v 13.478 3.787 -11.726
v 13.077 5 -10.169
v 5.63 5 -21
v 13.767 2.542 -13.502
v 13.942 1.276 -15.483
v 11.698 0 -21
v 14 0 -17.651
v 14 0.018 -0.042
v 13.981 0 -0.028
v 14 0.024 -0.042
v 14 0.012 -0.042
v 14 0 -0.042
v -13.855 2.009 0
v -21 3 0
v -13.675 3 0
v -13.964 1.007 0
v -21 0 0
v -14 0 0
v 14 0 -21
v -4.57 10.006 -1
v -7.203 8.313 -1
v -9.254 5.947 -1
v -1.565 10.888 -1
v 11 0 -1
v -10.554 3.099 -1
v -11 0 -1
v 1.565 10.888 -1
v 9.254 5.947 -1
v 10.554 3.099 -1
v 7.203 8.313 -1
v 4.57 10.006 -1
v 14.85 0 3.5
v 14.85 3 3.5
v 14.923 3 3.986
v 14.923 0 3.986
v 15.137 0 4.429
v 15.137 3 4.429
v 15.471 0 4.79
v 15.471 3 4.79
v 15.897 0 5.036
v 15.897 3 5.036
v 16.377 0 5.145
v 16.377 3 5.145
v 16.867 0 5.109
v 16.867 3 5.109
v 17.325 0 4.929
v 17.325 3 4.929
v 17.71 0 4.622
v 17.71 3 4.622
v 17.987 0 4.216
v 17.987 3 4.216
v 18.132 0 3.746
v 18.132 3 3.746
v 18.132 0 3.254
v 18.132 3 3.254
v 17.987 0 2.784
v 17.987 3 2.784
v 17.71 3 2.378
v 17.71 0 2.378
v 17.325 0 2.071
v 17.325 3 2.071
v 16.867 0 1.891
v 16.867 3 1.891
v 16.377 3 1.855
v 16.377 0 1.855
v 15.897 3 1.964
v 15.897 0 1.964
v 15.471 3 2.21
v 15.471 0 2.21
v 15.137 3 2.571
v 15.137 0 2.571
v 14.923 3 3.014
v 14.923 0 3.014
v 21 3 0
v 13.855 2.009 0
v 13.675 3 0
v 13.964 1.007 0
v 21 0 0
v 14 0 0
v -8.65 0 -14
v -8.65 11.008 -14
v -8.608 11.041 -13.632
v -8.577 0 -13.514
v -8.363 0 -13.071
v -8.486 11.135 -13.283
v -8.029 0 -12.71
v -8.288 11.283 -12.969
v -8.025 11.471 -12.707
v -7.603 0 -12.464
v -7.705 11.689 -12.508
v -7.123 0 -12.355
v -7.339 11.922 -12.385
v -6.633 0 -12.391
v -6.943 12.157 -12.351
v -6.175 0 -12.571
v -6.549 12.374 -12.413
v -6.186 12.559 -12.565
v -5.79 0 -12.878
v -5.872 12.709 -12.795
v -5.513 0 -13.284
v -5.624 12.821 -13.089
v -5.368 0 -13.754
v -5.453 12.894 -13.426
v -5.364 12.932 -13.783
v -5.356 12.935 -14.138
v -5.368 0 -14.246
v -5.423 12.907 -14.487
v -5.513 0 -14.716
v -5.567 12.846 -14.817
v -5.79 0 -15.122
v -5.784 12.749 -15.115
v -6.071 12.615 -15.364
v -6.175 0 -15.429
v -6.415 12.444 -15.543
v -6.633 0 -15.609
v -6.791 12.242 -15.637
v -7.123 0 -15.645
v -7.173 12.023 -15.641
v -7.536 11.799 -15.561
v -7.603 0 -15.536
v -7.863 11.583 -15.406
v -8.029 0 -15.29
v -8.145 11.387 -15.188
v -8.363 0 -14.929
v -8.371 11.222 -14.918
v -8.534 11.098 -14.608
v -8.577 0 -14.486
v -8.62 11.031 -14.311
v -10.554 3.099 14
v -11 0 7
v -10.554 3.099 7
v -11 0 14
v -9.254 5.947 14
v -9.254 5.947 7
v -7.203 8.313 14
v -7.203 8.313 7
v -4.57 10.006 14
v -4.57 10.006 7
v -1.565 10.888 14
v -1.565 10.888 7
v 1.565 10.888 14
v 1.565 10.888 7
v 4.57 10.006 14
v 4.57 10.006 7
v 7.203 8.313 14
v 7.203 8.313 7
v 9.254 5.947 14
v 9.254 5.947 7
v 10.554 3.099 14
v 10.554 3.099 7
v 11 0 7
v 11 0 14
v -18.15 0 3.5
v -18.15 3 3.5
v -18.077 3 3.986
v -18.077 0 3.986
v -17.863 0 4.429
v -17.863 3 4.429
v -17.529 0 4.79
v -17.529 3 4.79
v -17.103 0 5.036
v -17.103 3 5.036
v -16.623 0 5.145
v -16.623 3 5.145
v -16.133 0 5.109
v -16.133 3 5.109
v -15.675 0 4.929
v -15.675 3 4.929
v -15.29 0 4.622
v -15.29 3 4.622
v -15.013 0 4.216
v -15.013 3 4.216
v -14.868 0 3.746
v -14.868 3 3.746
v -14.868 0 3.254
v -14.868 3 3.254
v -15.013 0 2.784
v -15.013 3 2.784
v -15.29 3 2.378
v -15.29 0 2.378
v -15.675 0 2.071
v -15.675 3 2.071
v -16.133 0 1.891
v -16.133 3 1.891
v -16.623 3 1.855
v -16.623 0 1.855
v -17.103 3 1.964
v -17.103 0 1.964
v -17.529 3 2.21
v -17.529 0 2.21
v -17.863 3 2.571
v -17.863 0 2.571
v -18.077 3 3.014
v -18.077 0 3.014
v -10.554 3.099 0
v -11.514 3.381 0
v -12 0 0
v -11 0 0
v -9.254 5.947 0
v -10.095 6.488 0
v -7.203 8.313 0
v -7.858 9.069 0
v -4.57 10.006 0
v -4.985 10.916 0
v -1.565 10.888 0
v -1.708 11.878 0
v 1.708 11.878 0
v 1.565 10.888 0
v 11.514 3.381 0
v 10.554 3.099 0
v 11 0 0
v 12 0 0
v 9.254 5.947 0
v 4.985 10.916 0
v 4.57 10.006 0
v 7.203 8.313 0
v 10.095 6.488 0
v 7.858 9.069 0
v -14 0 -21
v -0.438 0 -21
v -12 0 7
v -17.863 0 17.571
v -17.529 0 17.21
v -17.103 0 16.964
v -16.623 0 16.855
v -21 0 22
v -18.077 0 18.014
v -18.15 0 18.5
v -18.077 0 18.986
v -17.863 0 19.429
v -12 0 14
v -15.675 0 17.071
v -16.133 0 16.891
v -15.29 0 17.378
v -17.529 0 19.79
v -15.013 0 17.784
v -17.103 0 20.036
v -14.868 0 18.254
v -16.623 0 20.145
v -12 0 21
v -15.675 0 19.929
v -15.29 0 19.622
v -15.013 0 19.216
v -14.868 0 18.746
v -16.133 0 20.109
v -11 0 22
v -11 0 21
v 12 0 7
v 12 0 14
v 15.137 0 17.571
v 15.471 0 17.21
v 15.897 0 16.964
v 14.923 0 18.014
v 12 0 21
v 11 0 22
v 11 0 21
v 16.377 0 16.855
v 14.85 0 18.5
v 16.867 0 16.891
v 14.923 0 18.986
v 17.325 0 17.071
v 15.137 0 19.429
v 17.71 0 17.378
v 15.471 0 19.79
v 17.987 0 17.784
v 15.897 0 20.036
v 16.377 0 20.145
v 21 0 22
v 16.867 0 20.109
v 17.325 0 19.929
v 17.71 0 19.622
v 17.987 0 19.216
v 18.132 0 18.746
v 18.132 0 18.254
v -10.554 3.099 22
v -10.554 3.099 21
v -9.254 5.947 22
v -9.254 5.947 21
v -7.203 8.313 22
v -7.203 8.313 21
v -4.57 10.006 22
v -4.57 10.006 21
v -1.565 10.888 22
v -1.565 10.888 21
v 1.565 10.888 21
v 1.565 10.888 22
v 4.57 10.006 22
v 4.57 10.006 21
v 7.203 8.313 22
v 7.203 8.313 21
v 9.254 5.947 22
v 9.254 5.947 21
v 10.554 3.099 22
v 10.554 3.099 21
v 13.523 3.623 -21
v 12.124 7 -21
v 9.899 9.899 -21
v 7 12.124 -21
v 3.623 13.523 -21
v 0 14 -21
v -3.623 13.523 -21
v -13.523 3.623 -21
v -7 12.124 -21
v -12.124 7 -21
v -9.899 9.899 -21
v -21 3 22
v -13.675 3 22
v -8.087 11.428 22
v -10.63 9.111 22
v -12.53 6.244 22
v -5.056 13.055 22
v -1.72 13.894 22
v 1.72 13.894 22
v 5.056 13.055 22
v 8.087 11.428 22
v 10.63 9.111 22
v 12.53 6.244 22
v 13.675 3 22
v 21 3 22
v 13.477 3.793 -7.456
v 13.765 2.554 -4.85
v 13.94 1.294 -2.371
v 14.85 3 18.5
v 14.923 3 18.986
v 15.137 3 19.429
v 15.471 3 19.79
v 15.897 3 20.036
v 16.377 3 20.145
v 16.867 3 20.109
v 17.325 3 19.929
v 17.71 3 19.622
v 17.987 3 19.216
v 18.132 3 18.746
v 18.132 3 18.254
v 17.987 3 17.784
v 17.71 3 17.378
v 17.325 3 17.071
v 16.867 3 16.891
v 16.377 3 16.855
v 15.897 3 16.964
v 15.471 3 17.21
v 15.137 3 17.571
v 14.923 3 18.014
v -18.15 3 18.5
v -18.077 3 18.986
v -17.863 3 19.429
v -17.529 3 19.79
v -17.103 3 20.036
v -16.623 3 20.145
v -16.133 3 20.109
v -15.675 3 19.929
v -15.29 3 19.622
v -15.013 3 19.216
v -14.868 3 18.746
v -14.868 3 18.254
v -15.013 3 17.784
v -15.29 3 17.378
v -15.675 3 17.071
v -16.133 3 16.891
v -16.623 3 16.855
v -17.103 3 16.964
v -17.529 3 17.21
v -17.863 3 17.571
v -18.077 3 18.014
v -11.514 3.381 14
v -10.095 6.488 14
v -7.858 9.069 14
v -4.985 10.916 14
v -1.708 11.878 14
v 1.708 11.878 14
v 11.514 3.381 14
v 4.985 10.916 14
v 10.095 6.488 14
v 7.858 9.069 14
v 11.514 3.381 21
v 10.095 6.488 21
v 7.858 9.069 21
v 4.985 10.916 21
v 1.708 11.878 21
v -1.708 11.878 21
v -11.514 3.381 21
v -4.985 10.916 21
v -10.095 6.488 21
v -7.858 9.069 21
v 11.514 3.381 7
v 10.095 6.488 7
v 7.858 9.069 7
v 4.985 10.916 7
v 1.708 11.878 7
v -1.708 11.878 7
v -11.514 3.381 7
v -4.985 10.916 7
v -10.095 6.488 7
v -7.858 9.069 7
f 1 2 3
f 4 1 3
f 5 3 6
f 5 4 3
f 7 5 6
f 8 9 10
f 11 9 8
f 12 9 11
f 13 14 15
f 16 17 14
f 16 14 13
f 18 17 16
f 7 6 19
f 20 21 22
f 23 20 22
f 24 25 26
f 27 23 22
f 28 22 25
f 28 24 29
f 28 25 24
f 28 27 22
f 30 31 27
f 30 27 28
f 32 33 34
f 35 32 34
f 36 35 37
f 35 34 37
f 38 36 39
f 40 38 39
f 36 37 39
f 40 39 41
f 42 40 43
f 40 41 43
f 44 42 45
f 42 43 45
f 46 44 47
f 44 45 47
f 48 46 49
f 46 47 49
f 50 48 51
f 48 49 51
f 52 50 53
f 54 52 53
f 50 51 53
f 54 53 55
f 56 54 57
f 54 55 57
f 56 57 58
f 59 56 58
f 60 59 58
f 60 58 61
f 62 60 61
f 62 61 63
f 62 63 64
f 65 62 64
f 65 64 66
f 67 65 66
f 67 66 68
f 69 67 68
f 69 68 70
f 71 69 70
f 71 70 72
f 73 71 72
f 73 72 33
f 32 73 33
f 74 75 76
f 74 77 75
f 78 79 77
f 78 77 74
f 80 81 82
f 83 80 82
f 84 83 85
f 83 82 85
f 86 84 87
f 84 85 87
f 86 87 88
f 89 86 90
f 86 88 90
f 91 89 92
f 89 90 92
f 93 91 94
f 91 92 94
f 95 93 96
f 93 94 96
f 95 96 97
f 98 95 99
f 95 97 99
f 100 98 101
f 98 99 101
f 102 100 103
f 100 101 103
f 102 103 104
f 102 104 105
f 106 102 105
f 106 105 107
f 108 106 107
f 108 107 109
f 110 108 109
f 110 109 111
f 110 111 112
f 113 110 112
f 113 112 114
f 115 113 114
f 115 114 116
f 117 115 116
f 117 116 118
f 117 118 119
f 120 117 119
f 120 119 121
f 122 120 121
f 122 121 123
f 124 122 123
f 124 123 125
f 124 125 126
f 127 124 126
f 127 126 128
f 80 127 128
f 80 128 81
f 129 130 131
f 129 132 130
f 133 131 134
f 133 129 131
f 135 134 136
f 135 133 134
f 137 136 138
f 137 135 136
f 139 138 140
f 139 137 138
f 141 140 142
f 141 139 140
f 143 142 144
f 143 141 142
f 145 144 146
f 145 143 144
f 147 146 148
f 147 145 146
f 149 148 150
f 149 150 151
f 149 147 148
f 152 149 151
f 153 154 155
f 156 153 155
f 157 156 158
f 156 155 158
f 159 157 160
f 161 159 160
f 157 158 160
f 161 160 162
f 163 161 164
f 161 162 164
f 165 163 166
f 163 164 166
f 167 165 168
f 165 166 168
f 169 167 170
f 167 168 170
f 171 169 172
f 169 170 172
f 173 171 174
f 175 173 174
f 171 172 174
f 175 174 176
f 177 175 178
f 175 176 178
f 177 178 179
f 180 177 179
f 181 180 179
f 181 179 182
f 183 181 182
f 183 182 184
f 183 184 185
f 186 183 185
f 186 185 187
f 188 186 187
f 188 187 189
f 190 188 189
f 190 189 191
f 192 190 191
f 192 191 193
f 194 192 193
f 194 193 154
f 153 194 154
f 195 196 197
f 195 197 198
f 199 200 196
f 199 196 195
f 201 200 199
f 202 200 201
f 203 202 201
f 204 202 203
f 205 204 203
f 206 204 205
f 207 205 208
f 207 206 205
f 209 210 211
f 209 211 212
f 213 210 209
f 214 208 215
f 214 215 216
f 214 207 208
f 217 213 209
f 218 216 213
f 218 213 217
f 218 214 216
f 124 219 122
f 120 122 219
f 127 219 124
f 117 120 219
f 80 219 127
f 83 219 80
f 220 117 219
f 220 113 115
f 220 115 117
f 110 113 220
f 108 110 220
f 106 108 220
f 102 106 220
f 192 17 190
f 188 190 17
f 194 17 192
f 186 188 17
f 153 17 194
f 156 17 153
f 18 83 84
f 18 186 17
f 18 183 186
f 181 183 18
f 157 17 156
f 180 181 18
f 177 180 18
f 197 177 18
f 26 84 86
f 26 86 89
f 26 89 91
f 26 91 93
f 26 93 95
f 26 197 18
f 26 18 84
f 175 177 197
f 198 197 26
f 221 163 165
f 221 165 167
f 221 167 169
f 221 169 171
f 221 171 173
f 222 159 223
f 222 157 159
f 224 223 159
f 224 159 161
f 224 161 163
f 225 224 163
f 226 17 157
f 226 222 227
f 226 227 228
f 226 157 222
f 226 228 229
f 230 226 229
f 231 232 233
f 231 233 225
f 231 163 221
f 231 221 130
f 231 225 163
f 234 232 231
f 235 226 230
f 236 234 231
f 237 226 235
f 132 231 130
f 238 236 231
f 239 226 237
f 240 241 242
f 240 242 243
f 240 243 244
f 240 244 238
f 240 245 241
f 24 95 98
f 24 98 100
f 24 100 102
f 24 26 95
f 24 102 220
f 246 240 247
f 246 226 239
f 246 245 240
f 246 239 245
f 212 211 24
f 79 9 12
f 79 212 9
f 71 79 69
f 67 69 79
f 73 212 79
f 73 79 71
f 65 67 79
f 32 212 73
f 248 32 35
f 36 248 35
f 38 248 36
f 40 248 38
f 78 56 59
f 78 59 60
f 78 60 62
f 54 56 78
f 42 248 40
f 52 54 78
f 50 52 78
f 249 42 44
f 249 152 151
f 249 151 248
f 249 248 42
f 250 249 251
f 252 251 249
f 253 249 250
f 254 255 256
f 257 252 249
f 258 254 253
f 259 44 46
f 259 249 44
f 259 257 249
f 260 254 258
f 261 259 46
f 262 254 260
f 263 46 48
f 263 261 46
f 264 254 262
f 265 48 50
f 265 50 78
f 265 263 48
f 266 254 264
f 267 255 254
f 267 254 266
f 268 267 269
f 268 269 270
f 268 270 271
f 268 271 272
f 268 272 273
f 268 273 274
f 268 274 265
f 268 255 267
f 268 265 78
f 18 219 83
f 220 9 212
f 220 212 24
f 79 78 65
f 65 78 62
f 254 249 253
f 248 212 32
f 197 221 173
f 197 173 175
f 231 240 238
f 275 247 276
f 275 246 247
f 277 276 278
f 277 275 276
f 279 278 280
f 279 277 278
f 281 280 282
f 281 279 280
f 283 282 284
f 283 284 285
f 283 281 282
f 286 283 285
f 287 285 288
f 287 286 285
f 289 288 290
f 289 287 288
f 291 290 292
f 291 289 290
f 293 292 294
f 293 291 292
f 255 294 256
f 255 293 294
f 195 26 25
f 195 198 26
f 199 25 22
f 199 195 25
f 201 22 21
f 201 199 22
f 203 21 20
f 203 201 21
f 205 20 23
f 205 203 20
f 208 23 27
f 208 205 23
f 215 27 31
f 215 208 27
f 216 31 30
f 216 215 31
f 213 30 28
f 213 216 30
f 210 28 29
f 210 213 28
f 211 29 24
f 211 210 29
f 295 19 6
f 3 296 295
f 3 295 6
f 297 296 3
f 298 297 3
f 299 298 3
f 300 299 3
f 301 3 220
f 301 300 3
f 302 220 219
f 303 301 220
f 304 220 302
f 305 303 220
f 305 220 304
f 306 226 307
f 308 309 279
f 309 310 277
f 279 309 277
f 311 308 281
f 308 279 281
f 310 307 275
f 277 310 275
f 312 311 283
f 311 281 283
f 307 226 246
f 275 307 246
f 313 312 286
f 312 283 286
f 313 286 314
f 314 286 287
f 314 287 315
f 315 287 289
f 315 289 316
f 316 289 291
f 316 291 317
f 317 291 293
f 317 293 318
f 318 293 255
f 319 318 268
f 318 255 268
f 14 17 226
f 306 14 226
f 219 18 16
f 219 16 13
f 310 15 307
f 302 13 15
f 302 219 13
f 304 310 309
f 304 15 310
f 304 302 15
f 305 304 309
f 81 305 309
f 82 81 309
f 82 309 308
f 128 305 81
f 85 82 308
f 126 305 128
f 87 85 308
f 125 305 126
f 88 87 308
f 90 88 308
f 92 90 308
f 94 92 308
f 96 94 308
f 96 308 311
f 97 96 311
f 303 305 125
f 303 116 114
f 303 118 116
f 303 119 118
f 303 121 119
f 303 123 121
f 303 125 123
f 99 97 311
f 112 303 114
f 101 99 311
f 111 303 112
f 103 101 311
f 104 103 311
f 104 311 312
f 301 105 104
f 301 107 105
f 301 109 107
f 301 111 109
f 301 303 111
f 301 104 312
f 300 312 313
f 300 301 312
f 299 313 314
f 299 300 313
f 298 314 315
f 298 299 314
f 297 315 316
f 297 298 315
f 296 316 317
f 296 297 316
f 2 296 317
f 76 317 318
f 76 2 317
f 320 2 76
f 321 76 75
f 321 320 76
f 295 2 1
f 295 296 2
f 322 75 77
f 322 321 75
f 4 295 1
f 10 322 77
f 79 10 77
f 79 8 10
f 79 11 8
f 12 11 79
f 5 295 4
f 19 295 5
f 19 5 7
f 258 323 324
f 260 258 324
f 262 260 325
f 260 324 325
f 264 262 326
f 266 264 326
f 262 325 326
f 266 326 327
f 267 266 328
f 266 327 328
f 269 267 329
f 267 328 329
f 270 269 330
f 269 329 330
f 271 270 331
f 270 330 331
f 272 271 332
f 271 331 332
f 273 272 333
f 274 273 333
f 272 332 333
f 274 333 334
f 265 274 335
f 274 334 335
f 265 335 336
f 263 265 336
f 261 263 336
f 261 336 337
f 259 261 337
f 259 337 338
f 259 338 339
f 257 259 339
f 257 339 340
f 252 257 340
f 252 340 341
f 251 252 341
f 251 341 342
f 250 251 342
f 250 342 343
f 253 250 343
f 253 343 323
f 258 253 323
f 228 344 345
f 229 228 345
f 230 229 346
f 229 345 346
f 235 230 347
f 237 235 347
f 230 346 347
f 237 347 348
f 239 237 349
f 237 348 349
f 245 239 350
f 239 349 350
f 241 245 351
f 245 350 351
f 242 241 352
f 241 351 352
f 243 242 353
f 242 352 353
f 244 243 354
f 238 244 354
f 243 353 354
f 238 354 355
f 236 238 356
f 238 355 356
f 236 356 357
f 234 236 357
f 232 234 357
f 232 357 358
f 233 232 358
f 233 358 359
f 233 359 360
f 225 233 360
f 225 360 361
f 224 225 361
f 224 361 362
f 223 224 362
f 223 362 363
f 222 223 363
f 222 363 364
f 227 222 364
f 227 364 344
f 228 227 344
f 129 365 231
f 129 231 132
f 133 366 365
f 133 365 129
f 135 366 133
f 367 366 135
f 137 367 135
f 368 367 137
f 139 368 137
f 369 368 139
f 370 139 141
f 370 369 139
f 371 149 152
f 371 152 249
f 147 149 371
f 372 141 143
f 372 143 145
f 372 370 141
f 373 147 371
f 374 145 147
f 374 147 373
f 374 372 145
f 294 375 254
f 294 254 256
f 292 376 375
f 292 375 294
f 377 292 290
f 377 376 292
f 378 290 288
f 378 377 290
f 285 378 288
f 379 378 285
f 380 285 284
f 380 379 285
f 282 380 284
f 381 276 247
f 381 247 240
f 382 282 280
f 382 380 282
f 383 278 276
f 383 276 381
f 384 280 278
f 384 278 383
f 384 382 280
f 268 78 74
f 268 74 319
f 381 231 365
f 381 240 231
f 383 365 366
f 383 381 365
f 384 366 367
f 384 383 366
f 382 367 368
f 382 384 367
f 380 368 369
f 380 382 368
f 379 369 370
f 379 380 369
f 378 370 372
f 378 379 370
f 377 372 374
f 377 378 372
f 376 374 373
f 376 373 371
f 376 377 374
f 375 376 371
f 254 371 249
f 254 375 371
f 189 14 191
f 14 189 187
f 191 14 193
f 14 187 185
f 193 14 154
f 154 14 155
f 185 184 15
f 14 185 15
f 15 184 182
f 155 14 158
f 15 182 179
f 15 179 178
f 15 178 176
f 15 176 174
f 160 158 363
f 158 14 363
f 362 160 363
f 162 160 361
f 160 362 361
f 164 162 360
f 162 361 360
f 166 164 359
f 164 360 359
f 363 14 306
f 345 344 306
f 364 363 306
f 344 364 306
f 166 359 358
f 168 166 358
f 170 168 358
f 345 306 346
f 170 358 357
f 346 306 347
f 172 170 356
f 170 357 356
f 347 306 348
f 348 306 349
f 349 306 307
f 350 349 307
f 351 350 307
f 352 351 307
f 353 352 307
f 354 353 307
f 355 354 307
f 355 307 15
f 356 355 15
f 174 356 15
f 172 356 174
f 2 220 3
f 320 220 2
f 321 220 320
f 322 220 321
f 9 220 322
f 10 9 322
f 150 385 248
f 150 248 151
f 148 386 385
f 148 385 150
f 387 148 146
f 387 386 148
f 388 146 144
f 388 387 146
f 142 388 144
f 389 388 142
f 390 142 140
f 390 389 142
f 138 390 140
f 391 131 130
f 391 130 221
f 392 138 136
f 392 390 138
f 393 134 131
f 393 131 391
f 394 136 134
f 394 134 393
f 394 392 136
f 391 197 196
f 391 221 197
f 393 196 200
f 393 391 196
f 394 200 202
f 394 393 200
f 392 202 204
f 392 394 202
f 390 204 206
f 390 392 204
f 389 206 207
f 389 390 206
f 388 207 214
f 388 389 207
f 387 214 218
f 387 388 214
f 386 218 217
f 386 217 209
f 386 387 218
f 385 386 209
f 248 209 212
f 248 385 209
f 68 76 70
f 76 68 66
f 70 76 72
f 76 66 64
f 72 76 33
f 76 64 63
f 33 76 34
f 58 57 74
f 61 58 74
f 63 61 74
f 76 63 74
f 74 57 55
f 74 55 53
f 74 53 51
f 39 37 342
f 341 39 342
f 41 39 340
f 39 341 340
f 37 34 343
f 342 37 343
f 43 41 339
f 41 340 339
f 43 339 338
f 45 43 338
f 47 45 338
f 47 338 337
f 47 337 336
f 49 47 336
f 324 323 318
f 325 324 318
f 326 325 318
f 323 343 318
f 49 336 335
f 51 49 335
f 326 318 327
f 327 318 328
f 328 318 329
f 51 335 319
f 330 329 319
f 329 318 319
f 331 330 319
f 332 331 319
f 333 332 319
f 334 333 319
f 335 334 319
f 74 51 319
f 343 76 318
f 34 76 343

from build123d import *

# Parameters (mm, degrees)
F1_ANGLE = 180
F2_W     = 9
F2_H     = 22
F3_DEPTH = 3
F4_D     = 3.3
F8_DEPTH = 30


with BuildPart() as f1:
    # F0 (on Front) → F1 (revolve)
    with BuildSketch(Plane.XZ):
        Polygon((-12, 21), (-11, 21), (-11, 22), (-14, 22), (-14, -21), (0, -21), (0, -1), (-11, -1), (-11, 0), (-12, 0), (-12, 7), (-11, 7), (-11, 14), (-12, 14), align=None)
    revolve(axis=Axis((0, 0, -11), (0, 0, -1)), revolution_arc=F1_ANGLE)

    # F2 (on face) → F3 (join)
    with BuildSketch(Plane.XZ):
        with Locations((-16.5, 11)):
            Rectangle(F2_W, F2_H)
        with Locations((16.5, 11)):
            Rectangle(F2_W, F2_H)
    extrude(amount=-F3_DEPTH)

    # F4 (through all)
    with Locations(Plane.XZ):
        with Locations((-16.5, 18.5), (-16.5, 3.5), (-7, -14), (16.5, 18.5), (16.5, 3.5)):
            Hole(F4_D / 2)

    # F7 (on offset) → F8 (cut)
    with BuildSketch(Plane(origin=(4.4739377588, 0, 6.5075458311), x_dir=(0.8240419242, 0, -0.5665288229), z_dir=(-0.5665288229, 0, -0.8240419242))):
        Polygon((16.5365869388, -5), (21.5365869388, 0), (11.5365869388, 0), align=None)
    extrude(amount=F8_DEPTH, mode=Mode.SUBTRACT)


solid = f1.part
